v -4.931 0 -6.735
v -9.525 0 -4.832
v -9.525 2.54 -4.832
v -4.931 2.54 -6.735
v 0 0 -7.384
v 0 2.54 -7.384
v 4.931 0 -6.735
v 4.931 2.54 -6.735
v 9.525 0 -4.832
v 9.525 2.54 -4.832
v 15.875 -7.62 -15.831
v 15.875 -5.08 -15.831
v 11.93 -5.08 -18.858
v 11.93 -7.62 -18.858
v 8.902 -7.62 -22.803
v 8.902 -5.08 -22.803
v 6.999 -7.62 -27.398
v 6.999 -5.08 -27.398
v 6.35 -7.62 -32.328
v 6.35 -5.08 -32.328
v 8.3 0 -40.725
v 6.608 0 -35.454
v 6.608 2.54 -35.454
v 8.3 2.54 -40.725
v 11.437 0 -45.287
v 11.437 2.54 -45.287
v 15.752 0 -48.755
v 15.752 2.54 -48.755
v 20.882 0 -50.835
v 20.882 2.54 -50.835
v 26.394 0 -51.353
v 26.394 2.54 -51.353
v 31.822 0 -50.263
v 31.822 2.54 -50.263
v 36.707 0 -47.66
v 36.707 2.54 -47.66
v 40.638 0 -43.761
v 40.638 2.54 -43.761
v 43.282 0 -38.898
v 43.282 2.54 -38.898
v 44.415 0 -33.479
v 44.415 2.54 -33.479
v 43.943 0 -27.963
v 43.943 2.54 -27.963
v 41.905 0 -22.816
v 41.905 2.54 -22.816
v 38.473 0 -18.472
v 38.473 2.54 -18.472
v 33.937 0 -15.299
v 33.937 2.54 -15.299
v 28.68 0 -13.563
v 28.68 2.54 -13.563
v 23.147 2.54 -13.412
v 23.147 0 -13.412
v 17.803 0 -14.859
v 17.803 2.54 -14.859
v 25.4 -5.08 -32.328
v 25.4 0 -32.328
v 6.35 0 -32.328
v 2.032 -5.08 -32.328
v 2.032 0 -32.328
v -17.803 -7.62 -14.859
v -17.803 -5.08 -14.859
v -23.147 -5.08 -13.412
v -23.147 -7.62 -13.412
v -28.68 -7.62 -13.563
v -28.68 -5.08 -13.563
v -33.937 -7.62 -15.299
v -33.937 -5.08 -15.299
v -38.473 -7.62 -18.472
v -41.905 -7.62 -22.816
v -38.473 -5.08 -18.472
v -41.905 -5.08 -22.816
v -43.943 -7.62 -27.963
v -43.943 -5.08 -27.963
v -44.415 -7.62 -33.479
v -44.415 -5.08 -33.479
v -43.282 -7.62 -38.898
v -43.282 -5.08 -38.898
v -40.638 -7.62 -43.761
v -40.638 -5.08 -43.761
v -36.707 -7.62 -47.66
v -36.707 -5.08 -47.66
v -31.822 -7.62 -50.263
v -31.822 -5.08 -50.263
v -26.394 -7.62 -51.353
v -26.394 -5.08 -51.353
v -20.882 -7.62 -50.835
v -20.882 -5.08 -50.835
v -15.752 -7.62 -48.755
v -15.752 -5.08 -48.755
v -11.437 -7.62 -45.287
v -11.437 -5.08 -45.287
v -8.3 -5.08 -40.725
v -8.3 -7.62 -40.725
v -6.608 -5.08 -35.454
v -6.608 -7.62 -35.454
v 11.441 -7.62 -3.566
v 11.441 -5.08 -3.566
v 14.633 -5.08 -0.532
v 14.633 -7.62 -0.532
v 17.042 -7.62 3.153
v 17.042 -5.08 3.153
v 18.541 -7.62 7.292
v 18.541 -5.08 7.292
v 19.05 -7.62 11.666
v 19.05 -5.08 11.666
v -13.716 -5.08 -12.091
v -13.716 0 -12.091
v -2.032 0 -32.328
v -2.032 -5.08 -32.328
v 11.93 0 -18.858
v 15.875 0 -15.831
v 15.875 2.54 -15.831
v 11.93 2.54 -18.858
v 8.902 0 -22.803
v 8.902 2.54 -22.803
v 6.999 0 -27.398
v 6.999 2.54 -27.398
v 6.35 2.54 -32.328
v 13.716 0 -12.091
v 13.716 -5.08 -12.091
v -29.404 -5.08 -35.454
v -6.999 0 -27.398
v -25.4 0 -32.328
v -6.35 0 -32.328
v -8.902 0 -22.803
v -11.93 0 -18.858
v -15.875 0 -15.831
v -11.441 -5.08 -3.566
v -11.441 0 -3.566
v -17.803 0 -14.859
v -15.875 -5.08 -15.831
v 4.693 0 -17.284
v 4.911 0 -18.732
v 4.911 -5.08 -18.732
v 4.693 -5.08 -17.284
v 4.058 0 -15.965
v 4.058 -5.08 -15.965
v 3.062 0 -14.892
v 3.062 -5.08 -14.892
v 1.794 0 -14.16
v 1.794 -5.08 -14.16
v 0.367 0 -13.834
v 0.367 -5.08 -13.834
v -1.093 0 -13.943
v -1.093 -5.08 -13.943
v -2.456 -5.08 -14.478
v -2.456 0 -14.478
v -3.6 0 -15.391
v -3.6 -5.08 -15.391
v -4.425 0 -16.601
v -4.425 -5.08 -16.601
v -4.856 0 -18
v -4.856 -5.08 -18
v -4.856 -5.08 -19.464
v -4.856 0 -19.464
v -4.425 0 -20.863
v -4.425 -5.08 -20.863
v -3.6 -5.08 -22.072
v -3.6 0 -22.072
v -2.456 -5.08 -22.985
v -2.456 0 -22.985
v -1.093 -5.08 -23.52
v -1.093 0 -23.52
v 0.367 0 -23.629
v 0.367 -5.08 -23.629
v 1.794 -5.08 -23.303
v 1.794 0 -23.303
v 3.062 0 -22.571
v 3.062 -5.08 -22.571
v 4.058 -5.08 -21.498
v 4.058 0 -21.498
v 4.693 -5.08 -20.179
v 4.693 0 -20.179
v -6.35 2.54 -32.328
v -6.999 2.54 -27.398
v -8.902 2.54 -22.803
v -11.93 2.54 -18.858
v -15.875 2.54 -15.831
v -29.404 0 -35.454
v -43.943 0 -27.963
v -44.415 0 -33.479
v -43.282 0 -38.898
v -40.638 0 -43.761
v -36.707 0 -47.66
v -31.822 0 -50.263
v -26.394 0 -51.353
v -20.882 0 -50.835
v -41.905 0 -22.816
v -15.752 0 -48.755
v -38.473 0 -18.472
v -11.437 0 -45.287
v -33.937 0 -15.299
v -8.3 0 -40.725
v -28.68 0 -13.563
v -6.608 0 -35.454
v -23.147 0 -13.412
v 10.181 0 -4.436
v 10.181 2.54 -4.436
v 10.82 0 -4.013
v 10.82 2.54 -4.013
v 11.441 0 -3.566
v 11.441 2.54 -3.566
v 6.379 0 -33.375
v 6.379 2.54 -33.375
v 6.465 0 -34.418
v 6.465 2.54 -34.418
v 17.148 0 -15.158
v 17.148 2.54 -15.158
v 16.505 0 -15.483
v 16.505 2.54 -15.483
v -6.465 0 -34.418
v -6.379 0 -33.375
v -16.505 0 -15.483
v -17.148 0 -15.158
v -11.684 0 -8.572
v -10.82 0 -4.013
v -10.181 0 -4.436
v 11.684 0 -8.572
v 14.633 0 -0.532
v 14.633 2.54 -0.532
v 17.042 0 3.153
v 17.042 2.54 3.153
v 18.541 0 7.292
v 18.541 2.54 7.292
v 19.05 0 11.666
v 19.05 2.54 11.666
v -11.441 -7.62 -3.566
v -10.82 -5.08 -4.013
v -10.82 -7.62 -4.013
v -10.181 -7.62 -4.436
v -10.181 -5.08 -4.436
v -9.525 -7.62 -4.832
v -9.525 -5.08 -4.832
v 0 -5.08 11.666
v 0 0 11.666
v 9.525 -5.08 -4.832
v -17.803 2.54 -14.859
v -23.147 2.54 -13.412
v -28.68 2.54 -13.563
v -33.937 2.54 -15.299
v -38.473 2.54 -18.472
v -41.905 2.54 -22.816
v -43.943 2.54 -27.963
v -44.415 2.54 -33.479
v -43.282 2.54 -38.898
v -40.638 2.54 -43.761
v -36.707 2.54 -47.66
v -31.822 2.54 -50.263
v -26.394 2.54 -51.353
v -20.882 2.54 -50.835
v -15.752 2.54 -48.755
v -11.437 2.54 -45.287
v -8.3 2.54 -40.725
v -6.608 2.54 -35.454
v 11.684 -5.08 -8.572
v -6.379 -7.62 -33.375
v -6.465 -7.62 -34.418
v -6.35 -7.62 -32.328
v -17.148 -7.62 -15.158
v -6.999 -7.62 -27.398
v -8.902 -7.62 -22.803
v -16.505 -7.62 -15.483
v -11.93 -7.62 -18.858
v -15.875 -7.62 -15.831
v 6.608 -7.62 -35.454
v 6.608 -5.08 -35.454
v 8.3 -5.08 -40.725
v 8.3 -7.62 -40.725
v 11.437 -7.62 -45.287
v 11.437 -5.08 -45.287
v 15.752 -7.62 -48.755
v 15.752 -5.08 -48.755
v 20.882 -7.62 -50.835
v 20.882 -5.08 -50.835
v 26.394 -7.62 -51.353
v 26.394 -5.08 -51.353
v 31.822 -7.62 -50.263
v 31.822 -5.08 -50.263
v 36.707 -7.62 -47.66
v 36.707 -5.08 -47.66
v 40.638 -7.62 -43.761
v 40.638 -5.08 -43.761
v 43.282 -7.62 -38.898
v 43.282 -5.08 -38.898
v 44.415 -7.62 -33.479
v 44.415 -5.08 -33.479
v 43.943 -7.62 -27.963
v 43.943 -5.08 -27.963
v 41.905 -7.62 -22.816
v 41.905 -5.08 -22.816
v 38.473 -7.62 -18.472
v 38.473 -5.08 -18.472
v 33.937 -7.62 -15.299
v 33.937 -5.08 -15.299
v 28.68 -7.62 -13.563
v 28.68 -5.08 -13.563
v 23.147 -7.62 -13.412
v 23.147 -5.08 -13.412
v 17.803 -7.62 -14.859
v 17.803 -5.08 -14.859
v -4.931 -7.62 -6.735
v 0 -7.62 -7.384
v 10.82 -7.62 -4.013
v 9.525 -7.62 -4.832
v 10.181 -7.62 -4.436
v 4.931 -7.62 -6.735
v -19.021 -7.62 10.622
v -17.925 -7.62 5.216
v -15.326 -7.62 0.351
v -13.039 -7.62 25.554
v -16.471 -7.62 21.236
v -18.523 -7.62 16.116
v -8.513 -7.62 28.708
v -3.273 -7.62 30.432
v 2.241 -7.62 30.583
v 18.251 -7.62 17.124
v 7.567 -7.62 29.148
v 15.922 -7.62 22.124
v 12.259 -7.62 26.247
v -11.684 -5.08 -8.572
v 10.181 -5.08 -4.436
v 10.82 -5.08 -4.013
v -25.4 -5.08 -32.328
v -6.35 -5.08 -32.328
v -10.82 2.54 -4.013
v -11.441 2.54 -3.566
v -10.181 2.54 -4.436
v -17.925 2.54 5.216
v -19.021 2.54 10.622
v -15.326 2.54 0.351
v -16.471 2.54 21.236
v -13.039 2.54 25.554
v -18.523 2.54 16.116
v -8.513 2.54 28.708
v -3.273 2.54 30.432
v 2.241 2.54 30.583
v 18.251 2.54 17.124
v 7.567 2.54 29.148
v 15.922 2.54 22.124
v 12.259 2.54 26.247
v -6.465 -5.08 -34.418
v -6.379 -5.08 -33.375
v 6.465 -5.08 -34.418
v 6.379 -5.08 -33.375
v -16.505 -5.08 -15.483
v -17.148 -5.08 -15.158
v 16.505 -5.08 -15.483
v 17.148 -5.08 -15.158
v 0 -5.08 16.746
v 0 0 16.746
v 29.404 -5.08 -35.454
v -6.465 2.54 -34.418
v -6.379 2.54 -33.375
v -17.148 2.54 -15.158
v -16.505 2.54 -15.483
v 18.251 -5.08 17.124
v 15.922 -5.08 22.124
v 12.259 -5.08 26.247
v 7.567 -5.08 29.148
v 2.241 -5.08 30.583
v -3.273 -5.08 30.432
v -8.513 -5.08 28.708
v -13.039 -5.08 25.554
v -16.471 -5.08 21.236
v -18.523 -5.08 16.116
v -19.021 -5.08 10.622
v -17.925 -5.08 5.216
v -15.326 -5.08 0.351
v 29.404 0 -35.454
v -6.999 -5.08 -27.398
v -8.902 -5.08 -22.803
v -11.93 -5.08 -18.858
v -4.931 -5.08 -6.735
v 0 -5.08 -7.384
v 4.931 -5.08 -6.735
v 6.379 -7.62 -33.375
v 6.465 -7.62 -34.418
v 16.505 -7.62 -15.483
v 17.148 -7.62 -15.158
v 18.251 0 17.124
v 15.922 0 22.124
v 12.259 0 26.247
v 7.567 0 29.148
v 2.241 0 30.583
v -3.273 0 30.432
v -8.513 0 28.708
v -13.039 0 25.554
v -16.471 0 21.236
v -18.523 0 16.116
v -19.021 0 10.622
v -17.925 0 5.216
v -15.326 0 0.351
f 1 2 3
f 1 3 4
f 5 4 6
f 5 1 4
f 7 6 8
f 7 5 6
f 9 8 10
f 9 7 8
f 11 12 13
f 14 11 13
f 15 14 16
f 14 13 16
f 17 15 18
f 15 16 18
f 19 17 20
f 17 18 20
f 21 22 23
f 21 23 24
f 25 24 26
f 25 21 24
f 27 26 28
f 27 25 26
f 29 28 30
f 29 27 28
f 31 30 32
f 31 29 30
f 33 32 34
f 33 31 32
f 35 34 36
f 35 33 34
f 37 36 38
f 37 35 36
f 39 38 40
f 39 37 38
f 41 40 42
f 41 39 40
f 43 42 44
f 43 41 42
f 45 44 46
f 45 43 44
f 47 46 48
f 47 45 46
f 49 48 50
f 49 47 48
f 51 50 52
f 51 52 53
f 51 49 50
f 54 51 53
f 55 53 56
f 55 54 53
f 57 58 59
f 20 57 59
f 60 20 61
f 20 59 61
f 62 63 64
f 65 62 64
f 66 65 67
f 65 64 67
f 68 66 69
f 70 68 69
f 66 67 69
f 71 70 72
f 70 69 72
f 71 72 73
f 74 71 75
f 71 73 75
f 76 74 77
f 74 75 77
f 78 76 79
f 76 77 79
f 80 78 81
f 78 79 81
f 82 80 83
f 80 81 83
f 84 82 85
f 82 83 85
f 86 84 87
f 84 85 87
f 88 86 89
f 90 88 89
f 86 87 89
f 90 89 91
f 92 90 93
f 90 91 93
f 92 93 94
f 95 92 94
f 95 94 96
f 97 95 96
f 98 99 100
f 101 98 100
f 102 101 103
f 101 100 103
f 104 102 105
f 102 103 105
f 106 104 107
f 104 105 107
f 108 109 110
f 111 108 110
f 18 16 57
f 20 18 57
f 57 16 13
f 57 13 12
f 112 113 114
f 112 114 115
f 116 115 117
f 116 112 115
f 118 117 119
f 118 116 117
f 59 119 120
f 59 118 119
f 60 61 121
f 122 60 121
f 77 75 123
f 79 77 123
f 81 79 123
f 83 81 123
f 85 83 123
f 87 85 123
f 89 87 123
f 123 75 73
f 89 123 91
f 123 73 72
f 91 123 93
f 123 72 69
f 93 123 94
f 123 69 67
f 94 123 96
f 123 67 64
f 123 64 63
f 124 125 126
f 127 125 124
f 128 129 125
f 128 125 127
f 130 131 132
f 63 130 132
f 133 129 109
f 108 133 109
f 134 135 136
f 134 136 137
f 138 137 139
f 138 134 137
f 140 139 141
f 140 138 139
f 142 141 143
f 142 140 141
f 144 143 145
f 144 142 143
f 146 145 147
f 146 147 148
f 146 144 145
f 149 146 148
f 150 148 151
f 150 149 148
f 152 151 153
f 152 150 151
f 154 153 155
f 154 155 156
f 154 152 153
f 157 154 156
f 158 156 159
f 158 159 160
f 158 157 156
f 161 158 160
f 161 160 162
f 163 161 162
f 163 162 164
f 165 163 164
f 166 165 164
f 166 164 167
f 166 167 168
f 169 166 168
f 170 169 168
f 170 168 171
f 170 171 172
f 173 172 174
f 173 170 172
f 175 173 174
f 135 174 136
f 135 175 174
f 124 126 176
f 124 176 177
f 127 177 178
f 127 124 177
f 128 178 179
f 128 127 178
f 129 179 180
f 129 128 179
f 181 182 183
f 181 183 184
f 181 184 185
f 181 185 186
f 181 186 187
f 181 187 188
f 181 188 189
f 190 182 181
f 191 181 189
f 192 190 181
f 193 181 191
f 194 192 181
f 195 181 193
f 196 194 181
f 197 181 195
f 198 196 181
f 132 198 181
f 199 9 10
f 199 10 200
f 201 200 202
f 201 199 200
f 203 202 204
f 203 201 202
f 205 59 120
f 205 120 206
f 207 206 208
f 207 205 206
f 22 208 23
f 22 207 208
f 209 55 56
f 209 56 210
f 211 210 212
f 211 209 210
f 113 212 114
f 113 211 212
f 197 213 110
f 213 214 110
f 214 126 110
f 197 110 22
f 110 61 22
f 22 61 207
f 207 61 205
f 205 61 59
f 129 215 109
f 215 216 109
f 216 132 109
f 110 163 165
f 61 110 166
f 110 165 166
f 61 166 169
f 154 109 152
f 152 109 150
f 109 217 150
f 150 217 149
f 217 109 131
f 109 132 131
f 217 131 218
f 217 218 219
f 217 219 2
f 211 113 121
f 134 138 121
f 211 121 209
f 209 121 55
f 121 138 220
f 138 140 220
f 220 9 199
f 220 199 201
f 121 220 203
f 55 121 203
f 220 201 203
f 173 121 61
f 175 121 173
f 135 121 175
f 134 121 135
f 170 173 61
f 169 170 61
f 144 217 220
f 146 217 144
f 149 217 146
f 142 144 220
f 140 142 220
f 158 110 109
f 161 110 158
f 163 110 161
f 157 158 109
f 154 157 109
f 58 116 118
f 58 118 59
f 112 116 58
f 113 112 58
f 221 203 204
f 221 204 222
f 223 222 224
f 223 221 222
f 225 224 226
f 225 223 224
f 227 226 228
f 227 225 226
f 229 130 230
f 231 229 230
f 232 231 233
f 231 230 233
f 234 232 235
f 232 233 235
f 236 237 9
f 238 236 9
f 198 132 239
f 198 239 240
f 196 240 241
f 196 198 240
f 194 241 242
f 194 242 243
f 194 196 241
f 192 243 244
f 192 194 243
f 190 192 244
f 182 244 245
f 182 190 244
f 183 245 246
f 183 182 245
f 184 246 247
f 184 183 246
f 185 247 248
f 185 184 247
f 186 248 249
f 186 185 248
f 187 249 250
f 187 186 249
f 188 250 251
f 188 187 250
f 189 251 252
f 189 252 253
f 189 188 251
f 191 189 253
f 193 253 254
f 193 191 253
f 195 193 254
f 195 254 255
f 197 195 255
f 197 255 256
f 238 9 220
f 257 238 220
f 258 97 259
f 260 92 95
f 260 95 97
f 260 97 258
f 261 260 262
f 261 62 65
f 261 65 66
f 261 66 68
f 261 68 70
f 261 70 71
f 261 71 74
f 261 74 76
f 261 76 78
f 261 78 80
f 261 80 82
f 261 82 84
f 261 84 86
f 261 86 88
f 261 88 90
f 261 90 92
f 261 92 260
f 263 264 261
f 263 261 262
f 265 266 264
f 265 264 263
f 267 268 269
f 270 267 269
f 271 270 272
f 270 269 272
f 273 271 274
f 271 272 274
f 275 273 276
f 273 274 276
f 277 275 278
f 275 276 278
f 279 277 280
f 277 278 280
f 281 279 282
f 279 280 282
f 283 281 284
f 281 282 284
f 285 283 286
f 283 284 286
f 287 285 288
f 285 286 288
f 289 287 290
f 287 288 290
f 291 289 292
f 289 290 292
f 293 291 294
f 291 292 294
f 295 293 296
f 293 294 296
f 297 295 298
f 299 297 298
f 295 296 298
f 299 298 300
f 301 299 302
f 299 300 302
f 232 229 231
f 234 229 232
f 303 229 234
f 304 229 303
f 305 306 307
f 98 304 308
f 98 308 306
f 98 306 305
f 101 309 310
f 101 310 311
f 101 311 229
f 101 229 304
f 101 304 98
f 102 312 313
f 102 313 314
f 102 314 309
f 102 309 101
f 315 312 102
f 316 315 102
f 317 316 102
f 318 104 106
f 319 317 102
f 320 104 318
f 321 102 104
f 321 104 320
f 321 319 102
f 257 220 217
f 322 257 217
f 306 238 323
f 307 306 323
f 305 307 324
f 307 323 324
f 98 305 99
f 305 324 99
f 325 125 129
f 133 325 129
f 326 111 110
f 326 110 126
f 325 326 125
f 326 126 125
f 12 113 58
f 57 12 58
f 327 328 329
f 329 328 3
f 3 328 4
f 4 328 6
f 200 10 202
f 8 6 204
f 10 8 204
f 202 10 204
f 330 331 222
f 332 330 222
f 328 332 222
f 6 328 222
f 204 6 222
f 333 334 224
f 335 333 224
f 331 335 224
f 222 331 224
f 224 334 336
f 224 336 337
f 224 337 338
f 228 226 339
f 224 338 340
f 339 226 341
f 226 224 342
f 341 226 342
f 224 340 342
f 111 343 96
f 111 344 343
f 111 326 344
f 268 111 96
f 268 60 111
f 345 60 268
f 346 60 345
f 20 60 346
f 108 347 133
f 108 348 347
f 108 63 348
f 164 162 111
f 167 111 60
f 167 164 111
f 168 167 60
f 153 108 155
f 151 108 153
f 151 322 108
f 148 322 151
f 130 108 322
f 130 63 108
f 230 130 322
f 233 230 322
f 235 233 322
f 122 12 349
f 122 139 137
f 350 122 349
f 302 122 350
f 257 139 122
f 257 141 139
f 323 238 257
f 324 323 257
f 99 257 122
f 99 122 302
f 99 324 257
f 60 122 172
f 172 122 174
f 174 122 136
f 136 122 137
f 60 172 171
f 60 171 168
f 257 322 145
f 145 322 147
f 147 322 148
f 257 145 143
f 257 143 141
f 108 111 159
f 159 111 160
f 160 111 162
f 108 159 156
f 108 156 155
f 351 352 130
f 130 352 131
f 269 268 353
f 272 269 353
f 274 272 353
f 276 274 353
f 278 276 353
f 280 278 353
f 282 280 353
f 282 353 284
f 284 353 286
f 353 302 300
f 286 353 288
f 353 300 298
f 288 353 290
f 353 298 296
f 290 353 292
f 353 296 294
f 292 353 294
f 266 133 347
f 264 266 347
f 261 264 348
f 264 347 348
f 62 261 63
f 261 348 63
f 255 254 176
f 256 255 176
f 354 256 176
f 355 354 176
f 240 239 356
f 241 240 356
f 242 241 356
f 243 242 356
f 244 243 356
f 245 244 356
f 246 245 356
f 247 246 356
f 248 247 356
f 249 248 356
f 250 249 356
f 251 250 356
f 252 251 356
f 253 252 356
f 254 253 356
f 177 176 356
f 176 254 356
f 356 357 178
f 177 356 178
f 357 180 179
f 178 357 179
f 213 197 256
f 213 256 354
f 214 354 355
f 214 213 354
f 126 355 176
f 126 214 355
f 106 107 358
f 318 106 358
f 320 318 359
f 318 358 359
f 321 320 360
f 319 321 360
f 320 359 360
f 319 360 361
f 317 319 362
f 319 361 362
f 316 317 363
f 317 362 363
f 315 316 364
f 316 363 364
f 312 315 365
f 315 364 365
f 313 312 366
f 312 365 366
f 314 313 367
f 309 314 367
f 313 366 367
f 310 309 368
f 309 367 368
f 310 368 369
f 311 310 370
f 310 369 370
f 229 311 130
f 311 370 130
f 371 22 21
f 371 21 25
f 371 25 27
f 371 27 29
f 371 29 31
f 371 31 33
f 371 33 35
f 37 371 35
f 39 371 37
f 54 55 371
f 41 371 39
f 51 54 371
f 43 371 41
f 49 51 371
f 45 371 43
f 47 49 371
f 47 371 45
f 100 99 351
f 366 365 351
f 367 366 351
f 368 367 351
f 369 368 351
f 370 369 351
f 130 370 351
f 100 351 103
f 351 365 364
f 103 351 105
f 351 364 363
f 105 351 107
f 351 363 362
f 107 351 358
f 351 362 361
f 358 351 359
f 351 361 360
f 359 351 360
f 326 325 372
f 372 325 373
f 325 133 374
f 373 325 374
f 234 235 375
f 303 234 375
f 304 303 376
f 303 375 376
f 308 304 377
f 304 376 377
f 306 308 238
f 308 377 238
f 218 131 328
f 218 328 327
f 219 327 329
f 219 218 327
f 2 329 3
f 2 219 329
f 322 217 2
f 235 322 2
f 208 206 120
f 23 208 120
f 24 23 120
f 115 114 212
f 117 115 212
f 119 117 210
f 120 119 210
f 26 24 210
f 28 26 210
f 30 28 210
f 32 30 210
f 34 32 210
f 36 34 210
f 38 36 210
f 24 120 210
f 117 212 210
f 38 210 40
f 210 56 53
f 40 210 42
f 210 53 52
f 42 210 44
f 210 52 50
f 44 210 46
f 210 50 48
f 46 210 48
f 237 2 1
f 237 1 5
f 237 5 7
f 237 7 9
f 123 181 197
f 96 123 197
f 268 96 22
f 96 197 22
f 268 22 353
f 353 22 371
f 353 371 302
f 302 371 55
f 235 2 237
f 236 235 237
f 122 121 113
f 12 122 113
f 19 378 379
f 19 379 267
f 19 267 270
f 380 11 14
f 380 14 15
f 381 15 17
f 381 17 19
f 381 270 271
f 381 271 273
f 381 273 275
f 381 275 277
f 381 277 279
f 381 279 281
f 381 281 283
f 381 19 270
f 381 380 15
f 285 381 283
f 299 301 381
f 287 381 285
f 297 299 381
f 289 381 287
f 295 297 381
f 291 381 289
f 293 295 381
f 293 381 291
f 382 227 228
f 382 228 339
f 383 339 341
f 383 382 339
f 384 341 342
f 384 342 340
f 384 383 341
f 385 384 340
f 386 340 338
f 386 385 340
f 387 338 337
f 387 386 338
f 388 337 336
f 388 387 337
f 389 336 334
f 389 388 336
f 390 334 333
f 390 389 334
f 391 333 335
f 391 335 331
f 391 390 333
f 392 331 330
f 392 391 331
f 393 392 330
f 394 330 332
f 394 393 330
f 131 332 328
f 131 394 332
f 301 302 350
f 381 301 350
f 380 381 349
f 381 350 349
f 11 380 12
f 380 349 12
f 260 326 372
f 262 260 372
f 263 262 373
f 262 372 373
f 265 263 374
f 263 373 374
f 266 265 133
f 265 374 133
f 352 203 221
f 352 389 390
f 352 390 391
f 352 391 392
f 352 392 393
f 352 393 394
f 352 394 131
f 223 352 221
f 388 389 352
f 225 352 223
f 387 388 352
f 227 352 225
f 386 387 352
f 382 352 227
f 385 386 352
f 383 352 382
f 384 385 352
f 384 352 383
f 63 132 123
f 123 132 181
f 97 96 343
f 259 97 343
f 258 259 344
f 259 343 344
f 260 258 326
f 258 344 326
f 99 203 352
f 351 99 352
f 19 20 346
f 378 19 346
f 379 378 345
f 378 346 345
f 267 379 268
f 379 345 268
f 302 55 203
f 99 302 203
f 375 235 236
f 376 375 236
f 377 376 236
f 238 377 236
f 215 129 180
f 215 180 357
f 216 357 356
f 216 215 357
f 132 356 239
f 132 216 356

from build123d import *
from build123d import SkipClean  # not in build123d's __all__

# Parameters (mm, degrees)
F0_R     = 4.9113239183
F1_DEPTH = 5.08
F2_DEPTH = 2.54
F4_DEPTH = 2.54
F5_DEPTH = 5.08


# Not quite as in the source:
# - a feature names something its author has since deleted; it is built from what else it names


with BuildPart() as f1:
    # F0 (on Front) → F1 (new body)
    with BuildSketch(Plane.XZ):
        Polygon((11.684, -8.5716721153), (-11.684, -8.5716721153), (-12.7, -10.3314357358), (-13.716, -12.0911993563), (-2.032, -32.3284809919), (0, -32.3284809919), (2.032, -32.3284809919), (13.716, -12.0911993563), (12.7, -10.3314357358), align=None)
        with Locations((0, -18.7316721153)):
            Circle(F0_R, mode=Mode.SUBTRACT)
        with BuildLine():
            ThreePointArc((-11.4414768653, -3.5657760746), (-10.5023439874, -4.227888231), (-9.525, -4.8321744218))
            Line((-9.525, -4.8321744218), (0, 11.6656095203))
            Line((0, 11.6656095203), (0, 16.7456095203))
            Line((0, 16.7456095203), (-11.4414768653, -3.5657760746))
        make_face()
        with BuildLine():
            Line((9.525, -4.8321744218), (11.684, -8.5716721153))
            Line((11.684, -8.5716721153), (12.7, -10.3314357358))
            Line((12.7, -10.3314357358), (13.716, -12.0911993563))
            Line((13.716, -12.0911993563), (15.875, -15.8306970498))
            ThreePointArc((15.875, -15.8306970498), (16.8251832643, -15.3174546282), (17.8029235649, -14.8588808351))
            Line((17.8029235649, -14.8588808351), (11.4414768653, -3.5657760746))
            ThreePointArc((11.4414768653, -3.5657760746), (10.5023439874, -4.227888231), (9.525, -4.8321744218))
        make_face()
        with BuildLine():
            Line((0, 16.7456095203), (0, 11.6656095203))
            Line((0, 11.6656095203), (9.525, -4.8321744218))
            ThreePointArc((9.525, -4.8321744218), (10.5023439874, -4.227888231), (11.4414768653, -3.5657760746))
            Line((11.4414768653, -3.5657760746), (0, 16.7456095203))
        make_face()
        with BuildLine():
            Line((-25.4, -32.3284809919), (-15.875, -15.8306970498))
            ThreePointArc((-15.875, -15.8306970498), (-16.8251832643, -15.3174546282), (-17.8029235649, -14.8588808351))
            Line((-17.8029235649, -14.8588808351), (-29.4044214139, -35.4543423357))
            Line((-29.4044214139, -35.4543423357), (-25.4, -32.3284809919))
        make_face()
        with BuildLine():
            Line((0, -32.3284809919), (-2.032, -32.3284809919))
            Line((-2.032, -32.3284809919), (-6.35, -32.3284809919))
            ThreePointArc((-6.35, -32.3284809919), (-6.4146614456, -33.8967347902), (-6.6082068216, -35.4543423357))
            Line((-6.6082068216, -35.4543423357), (6.6082068216, -35.4543423357))
            ThreePointArc((6.6082068216, -35.4543423357), (6.4146614456, -33.8967347902), (6.35, -32.3284809919))
            Line((6.35, -32.3284809919), (2.032, -32.3284809919))
            Line((2.032, -32.3284809919), (0, -32.3284809919))
        make_face()
        with BuildLine():
            Line((-6.35, -32.3284809919), (-25.4, -32.3284809919))
            Line((-25.4, -32.3284809919), (-29.4044214139, -35.4543423357))
            Line((-29.4044214139, -35.4543423357), (-6.6082068216, -35.4543423357))
            ThreePointArc((-6.6082068216, -35.4543423357), (-6.4146614456, -33.8967347902), (-6.35, -32.3284809919))
        make_face()
        with BuildLine():
            Line((29.4044214139, -35.4543423357), (17.8029235649, -14.8588808351))
            ThreePointArc((17.8029235649, -14.8588808351), (16.8251832643, -15.3174546282), (15.875, -15.8306970498))
            Line((15.875, -15.8306970498), (25.4, -32.3284809919))
            Line((25.4, -32.3284809919), (29.4044214139, -35.4543423357))
        make_face()
        with BuildLine():
            ThreePointArc((6.35, -32.3284809919), (6.4146614456, -33.8967347902), (6.6082068216, -35.4543423357))
            Line((6.6082068216, -35.4543423357), (29.4044214139, -35.4543423357))
            Line((29.4044214139, -35.4543423357), (25.4, -32.3284809919))
            Line((25.4, -32.3284809919), (6.35, -32.3284809919))
        make_face()
    extrude(amount=F1_DEPTH)

    # F0 (on Front) → F2 (join)
    with BuildSketch(Plane.XZ):
        with BuildLine():
            ThreePointArc((19.05, 11.6656095203), (-8.5130008139, 28.7076550883), (-11.4414768653, -3.5657760746))
            Line((-11.4414768653, -3.5657760746), (0, 16.7456095203))
            Line((0, 16.7456095203), (11.4414768653, -3.5657760746))
            ThreePointArc((11.4414768653, -3.5657760746), (17.042045568, 3.1526087064), (19.05, 11.6656095203))
        make_face()
        with BuildLine():
            Line((0, 11.6656095203), (-9.525, -4.8321744218))
            ThreePointArc((-9.525, -4.8321744218), (0, -7.3843904797), (9.525, -4.8321744218))
            Line((9.525, -4.8321744218), (0, 11.6656095203))
        make_face()
        with BuildLine():
            Line((-29.4044214139, -35.4543423357), (-17.8029235649, -14.8588808351))
            ThreePointArc((-17.8029235649, -14.8588808351), (-42.1372748222, -41.4260703169), (-6.6082068216, -35.4543423357))
            Line((-6.6082068216, -35.4543423357), (-29.4044214139, -35.4543423357))
        make_face()
        with BuildLine():
            ThreePointArc((-6.35, -32.3284809919), (-8.9022160579, -22.8034809919), (-15.875, -15.8306970498))
            Line((-15.875, -15.8306970498), (-25.4, -32.3284809919))
            Line((-25.4, -32.3284809919), (-6.35, -32.3284809919))
        make_face()
        with BuildLine():
            ThreePointArc((44.45, -32.3284809919), (35.8445726076, -16.3969586841), (17.8029235649, -14.8588808351))
            Line((17.8029235649, -14.8588808351), (29.4044214139, -35.4543423357))
            Line((29.4044214139, -35.4543423357), (6.6082068216, -35.4543423357))
            ThreePointArc((6.6082068216, -35.4543423357), (26.9682537983, -51.3138195463), (44.45, -32.3284809919))
        make_face()
        with BuildLine():
            Line((25.4, -32.3284809919), (15.875, -15.8306970498))
            ThreePointArc((15.875, -15.8306970498), (8.9022160579, -22.8034809919), (6.35, -32.3284809919))
            Line((6.35, -32.3284809919), (25.4, -32.3284809919))
        make_face()
        with BuildLine():
            Line((-6.35, -32.3284809919), (-25.4, -32.3284809919))
            Line((-25.4, -32.3284809919), (-29.4044214139, -35.4543423357))
            Line((-29.4044214139, -35.4543423357), (-6.6082068216, -35.4543423357))
            ThreePointArc((-6.6082068216, -35.4543423357), (-6.4146614456, -33.8967347902), (-6.35, -32.3284809919))
        make_face()
        with BuildLine():
            Line((-25.4, -32.3284809919), (-15.875, -15.8306970498))
            ThreePointArc((-15.875, -15.8306970498), (-16.8251832643, -15.3174546282), (-17.8029235649, -14.8588808351))
            Line((-17.8029235649, -14.8588808351), (-29.4044214139, -35.4543423357))
            Line((-29.4044214139, -35.4543423357), (-25.4, -32.3284809919))
        make_face()
        with BuildLine():
            ThreePointArc((6.35, -32.3284809919), (6.4146614456, -33.8967347902), (6.6082068216, -35.4543423357))
            Line((6.6082068216, -35.4543423357), (29.4044214139, -35.4543423357))
            Line((29.4044214139, -35.4543423357), (25.4, -32.3284809919))
            Line((25.4, -32.3284809919), (6.35, -32.3284809919))
        make_face()
        with BuildLine():
            Line((29.4044214139, -35.4543423357), (17.8029235649, -14.8588808351))
            ThreePointArc((17.8029235649, -14.8588808351), (16.8251832643, -15.3174546282), (15.875, -15.8306970498))
            Line((15.875, -15.8306970498), (25.4, -32.3284809919))
            Line((25.4, -32.3284809919), (29.4044214139, -35.4543423357))
        make_face()
        with BuildLine():
            Line((0, 16.7456095203), (0, 11.6656095203))
            Line((0, 11.6656095203), (9.525, -4.8321744218))
            ThreePointArc((9.525, -4.8321744218), (10.5023439874, -4.227888231), (11.4414768653, -3.5657760746))
            Line((11.4414768653, -3.5657760746), (0, 16.7456095203))
        make_face()
        with BuildLine():
            ThreePointArc((-11.4414768653, -3.5657760746), (-10.5023439874, -4.227888231), (-9.525, -4.8321744218))
            Line((-9.525, -4.8321744218), (0, 11.6656095203))
            Line((0, 11.6656095203), (0, 16.7456095203))
            Line((0, 16.7456095203), (-11.4414768653, -3.5657760746))
        make_face()
    extrude(amount=-F2_DEPTH)

    # F3 (on face) → F4 (join)
    with BuildSketch(Plane.XZ.offset(5.08)):
        with BuildLine():
            ThreePointArc((11.4414768653, -3.5657760746), (17.042045568, 3.1526087064), (19.05, 11.6656095203))
            ThreePointArc((19.05, 11.6656095203), (-8.5130008139, 28.7076550883), (-11.4414768653, -3.5657760746))
            Line((-11.4414768653, -3.5657760746), (0, 16.7456095203))
            Line((0, 16.7456095203), (11.4414768653, -3.5657760746))
        make_face()
        with BuildLine():
            Line((0, 16.7456095203), (-11.4414768653, -3.5657760746))
            ThreePointArc((-11.4414768653, -3.5657760746), (-10.5023439874, -4.227888231), (-9.525, -4.8321744218))
            Line((-9.525, -4.8321744218), (0, 11.6656095203))
            Line((0, 11.6656095203), (9.525, -4.8321744218))
            ThreePointArc((9.525, -4.8321744218), (10.5023439874, -4.227888231), (11.4414768653, -3.5657760746))
            Line((11.4414768653, -3.5657760746), (0, 16.7456095203))
        make_face()
        with BuildLine():
            Line((0, 11.6656095203), (-9.525, -4.8321744218))
            ThreePointArc((-9.525, -4.8321744218), (0, -7.3843904797), (9.525, -4.8321744218))
            Line((9.525, -4.8321744218), (0, 11.6656095203))
        make_face()
        with BuildLine():
            Line((29.4044214139, -35.4543423357), (17.8029235649, -14.8588808351))
            ThreePointArc((17.8029235649, -14.8588808351), (16.8251832643, -15.3174546282), (15.875, -15.8306970498))
            Line((15.875, -15.8306970498), (25.4, -32.3284809919))
            Line((25.4, -32.3284809919), (6.35, -32.3284809919))
            ThreePointArc((6.35, -32.3284809919), (6.4146614456, -33.8967347902), (6.6082068216, -35.4543423357))
            Line((6.6082068216, -35.4543423357), (29.4044214139, -35.4543423357))
        make_face()
        with BuildLine():
            ThreePointArc((44.45, -32.3284809919), (35.8445726076, -16.3969586841), (17.8029235649, -14.8588808351))
            Line((17.8029235649, -14.8588808351), (29.4044214139, -35.4543423357))
            Line((29.4044214139, -35.4543423357), (6.6082068216, -35.4543423357))
            ThreePointArc((6.6082068216, -35.4543423357), (26.9682537983, -51.3138195463), (44.45, -32.3284809919))
        make_face()
        with BuildLine():
            Line((25.4, -32.3284809919), (15.875, -15.8306970498))
            ThreePointArc((15.875, -15.8306970498), (8.9022160579, -22.8034809919), (6.35, -32.3284809919))
            Line((6.35, -32.3284809919), (25.4, -32.3284809919))
        make_face()
        with BuildLine():
            Line((-29.4044214139, -35.4543423357), (-6.6082068216, -35.4543423357))
            ThreePointArc((-6.6082068216, -35.4543423357), (-6.4146614456, -33.8967347902), (-6.35, -32.3284809919))
            Line((-6.35, -32.3284809919), (-25.4, -32.3284809919))
            Line((-25.4, -32.3284809919), (-15.875, -15.8306970498))
            ThreePointArc((-15.875, -15.8306970498), (-16.8251832643, -15.3174546282), (-17.8029235649, -14.8588808351))
            Line((-17.8029235649, -14.8588808351), (-29.4044214139, -35.4543423357))
        make_face()
        with BuildLine():
            ThreePointArc((-17.8029235649, -14.8588808351), (-42.1372748222, -41.4260703169), (-6.6082068216, -35.4543423357))
            Line((-6.6082068216, -35.4543423357), (-29.4044214139, -35.4543423357))
            Line((-29.4044214139, -35.4543423357), (-17.8029235649, -14.8588808351))
        make_face()
        with BuildLine():
            Line((-25.4, -32.3284809919), (-6.35, -32.3284809919))
            ThreePointArc((-6.35, -32.3284809919), (-8.9022160579, -22.8034809919), (-15.875, -15.8306970498))
            Line((-15.875, -15.8306970498), (-25.4, -32.3284809919))
        make_face()
    with SkipClean():  # cleaning this boolean's faces spoils the solid; the shape is the same uncleaned
        extrude(amount=F4_DEPTH)

    # F0 (on Front) → F5 (join)
    with BuildSketch(Plane.XZ):
        Polygon((11.684, -8.5716721153), (-11.684, -8.5716721153), (-12.7, -10.3314357358), (-13.716, -12.0911993563), (-2.032, -32.3284809919), (0, -32.3284809919), (2.032, -32.3284809919), (13.716, -12.0911993563), (12.7, -10.3314357358), align=None)
        with Locations((0, -18.7316721153)):
            Circle(F0_R, mode=Mode.SUBTRACT)
        with BuildLine():
            Line((-12.7, -10.3314357358), (-11.684, -8.5716721153))
            Line((-11.684, -8.5716721153), (-9.525, -4.8321744218))
            ThreePointArc((-9.525, -4.8321744218), (-10.5023439874, -4.227888231), (-11.4414768653, -3.5657760746))
            Line((-11.4414768653, -3.5657760746), (-17.8029235649, -14.8588808351))
            ThreePointArc((-17.8029235649, -14.8588808351), (-16.8251832643, -15.3174546282), (-15.875, -15.8306970498))
            Line((-15.875, -15.8306970498), (-13.716, -12.0911993563))
            Line((-13.716, -12.0911993563), (-12.7, -10.3314357358))
        make_face()
    extrude(amount=F5_DEPTH)


solid = f1.part
